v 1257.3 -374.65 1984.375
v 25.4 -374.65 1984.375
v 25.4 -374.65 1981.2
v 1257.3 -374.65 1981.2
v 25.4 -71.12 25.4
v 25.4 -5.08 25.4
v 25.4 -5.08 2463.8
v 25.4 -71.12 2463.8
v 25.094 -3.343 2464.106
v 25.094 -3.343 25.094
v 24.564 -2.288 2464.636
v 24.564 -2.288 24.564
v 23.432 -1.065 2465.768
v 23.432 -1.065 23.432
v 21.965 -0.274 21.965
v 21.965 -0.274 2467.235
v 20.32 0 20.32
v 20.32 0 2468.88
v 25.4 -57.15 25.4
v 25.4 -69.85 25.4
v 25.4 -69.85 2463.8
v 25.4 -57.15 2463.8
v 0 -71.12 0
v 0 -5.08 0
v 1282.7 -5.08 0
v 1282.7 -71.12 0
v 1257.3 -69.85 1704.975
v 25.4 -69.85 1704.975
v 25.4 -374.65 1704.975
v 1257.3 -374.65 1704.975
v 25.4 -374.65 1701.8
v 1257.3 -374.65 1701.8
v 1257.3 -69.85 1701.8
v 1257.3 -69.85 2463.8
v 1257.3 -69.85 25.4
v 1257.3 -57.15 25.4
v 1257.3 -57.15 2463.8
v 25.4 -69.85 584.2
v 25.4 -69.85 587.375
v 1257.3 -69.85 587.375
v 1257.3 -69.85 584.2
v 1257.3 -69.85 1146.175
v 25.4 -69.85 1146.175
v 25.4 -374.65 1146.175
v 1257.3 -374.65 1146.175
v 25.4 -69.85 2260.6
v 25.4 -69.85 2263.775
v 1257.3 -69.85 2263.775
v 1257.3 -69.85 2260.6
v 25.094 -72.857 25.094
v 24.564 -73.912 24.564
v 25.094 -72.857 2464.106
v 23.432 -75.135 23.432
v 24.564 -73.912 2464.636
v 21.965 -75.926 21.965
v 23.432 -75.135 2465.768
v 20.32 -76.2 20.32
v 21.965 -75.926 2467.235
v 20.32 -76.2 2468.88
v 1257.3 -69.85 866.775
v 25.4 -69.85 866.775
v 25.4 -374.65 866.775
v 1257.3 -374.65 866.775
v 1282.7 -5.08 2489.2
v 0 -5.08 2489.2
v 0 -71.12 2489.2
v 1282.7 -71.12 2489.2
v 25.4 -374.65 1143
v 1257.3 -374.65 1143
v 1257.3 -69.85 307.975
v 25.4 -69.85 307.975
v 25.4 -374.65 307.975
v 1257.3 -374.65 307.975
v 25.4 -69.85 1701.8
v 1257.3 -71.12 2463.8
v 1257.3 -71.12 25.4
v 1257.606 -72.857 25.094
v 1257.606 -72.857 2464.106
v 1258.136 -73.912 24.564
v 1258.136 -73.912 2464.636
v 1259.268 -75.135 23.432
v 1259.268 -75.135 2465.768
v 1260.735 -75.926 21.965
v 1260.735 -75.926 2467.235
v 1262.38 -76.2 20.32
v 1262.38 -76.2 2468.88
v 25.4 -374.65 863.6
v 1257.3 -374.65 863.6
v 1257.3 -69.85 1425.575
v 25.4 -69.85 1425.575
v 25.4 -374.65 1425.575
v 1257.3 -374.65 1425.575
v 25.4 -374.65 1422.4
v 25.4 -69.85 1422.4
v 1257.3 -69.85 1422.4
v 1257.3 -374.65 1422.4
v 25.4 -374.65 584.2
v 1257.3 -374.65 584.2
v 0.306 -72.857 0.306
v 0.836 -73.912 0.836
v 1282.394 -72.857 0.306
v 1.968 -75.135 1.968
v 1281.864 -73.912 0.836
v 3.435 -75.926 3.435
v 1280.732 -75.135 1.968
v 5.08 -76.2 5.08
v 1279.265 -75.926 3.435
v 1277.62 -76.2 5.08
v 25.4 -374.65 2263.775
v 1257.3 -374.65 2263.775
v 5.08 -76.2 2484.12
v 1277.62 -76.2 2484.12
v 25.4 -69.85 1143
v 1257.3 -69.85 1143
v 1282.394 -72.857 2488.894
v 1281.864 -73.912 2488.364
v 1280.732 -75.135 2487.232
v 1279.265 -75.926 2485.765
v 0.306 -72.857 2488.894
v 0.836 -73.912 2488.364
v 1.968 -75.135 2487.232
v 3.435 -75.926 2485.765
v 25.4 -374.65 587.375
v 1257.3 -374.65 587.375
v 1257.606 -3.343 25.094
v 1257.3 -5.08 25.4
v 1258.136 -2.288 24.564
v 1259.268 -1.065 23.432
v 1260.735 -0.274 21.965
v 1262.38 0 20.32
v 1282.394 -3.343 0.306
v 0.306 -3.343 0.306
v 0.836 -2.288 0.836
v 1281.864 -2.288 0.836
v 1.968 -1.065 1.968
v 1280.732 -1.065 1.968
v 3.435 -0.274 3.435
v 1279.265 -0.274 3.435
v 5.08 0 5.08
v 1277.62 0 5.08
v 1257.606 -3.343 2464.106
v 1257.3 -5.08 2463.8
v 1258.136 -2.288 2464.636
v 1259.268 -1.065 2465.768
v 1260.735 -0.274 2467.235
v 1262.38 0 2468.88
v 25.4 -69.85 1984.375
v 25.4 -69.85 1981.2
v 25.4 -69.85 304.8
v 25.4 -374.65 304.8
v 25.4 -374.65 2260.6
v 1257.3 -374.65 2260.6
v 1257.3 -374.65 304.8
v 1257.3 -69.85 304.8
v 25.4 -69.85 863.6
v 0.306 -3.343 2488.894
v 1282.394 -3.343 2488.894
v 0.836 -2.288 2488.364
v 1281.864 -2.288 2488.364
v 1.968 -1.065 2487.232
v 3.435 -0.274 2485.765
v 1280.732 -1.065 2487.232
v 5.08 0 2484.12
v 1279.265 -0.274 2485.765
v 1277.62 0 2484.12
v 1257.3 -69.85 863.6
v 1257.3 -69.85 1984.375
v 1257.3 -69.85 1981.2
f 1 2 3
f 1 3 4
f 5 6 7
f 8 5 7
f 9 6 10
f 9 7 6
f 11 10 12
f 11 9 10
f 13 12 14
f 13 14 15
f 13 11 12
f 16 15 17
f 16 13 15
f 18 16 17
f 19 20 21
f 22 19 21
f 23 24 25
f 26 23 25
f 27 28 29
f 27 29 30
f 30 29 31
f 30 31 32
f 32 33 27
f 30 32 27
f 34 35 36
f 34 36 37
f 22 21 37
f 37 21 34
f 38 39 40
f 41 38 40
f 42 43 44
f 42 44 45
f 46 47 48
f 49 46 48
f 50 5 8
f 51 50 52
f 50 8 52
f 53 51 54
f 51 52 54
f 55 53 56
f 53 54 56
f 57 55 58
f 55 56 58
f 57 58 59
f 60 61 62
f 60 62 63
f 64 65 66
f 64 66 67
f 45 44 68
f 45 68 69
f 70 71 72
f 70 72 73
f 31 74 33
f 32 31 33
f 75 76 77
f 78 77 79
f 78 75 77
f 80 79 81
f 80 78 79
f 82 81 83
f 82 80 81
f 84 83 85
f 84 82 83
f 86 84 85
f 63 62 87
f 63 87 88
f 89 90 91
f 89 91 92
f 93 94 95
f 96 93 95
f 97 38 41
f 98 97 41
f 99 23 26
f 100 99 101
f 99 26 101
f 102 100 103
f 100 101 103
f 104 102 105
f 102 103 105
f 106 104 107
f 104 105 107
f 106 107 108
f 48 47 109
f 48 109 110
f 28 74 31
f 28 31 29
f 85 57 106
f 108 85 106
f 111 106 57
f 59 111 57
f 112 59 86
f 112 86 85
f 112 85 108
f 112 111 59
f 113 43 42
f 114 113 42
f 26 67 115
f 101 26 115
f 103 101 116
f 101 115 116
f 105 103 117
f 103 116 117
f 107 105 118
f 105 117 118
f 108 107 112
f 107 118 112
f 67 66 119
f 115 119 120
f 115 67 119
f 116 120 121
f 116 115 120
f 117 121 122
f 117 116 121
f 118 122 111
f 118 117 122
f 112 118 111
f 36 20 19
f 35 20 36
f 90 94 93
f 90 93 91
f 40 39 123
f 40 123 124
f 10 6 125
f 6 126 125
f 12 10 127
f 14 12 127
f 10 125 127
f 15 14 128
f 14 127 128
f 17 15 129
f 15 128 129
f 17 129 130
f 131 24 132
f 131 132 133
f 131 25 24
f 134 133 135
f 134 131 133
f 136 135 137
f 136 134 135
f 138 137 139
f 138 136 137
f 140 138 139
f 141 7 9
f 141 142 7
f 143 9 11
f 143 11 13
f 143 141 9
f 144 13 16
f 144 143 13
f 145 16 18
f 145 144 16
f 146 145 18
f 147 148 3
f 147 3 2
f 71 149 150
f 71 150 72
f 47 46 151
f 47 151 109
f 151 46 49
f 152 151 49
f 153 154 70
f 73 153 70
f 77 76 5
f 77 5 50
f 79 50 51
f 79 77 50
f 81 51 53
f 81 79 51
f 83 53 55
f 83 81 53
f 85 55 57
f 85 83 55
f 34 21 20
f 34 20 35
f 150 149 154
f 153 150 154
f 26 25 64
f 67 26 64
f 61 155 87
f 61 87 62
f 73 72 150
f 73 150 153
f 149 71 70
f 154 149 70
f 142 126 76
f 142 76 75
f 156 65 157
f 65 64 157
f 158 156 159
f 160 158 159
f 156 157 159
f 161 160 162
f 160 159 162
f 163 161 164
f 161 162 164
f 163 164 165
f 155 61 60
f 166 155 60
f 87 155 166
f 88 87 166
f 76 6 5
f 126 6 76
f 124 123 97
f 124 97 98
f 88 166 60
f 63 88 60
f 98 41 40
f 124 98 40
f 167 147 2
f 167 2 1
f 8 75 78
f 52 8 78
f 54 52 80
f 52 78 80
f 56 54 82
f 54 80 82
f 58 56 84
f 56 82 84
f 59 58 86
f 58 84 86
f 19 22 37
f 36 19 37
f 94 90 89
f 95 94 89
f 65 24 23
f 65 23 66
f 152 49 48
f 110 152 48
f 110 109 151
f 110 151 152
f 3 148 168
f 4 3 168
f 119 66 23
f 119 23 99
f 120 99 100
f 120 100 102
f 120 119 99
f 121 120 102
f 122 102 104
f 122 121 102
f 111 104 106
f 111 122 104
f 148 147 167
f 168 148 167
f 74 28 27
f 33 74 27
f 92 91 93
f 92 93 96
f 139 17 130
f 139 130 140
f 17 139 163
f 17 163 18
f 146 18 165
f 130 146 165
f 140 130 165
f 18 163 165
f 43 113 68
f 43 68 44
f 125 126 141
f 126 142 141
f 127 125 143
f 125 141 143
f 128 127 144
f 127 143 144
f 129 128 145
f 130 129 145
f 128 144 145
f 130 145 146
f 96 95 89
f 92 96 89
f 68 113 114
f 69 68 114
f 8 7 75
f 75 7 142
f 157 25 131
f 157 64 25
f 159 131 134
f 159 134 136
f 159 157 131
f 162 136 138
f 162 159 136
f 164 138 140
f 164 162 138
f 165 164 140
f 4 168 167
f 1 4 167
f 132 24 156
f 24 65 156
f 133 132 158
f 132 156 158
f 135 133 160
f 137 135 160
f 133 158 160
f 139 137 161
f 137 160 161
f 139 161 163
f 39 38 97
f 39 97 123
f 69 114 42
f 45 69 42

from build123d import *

# Parameters (mm, degrees)
F0_W     = 1282.7
F0_H     = 2489.2
F0_W_2   = 1231.9
F0_H_2   = 2438.4
F1_DEPTH = 76.2
F2_R     = 5.08
F4_W     = 1231.9
F4_H     = 2438.4
F5_DEPTH = 12.7
F6_W     = 1231.9
F6_H     = 3.175
F7_DEPTH = 304.8


with BuildPart() as f1:
    # F0 (on Front) → F1 (new body)
    with BuildSketch(Plane.XZ):
        with Locations((641.35, 1244.6)):
            Rectangle(F0_W, F0_H)
        with Locations((641.35, 1244.6)):
            Rectangle(F0_W_2, F0_H_2, mode=Mode.SUBTRACT)
    extrude(amount=F1_DEPTH)

    # F2
    f2_edges = [f1.edges().sort_by_distance(p)[0] for p in [
        (0, -76.2, 1244.6),
        (641.35, -76.2, 0),
        (1282.7, -76.2, 1244.6),
        (641.35, -76.2, 2489.2),
        (25.4, -76.2, 1244.6),
        (641.35, -76.2, 2463.8),
        (1257.3, -76.2, 1244.6),
        (641.35, -76.2, 25.4),
        (0, 0, 1244.6),
        (641.35, 0, 0),
        (1282.7, 0, 1244.6),
        (641.35, 0, 2489.2),
        (25.4, 0, 1244.6),
        (641.35, 0, 2463.8),
        (1257.3, 0, 1244.6),
        (641.35, 0, 25.4),
    ]]
    fillet(f2_edges, radius=F2_R)


with BuildPart() as f5:
    # F4 (on offset) → F5 (new body)
    with BuildSketch(Plane.XZ.offset(69.85)):
        with Locations((641.35, 1244.6)):
            Rectangle(F4_W, F4_H)
    extrude(amount=-F5_DEPTH)


with BuildPart() as f7:
    # F6 (on face) → F7 (new body)
    with BuildSketch(Plane.XZ.offset(69.85)):
        with Locations((641.35, 306.3875)):
            Rectangle(F6_W, F6_H)
    extrude(amount=F7_DEPTH)


with BuildPart() as f7b:
    # F6 (on face) → F7, piece 2 (new body)
    with BuildSketch(Plane.XZ.offset(69.85)):
        with Locations((641.35, 585.7875)):
            Rectangle(F6_W, F6_H)
    extrude(amount=F7_DEPTH)


with BuildPart() as f7c:
    # F6 (on face) → F7, piece 3 (new body)
    with BuildSketch(Plane.XZ.offset(69.85)):
        with Locations((641.35, 865.1875)):
            Rectangle(F6_W, F6_H)
    extrude(amount=F7_DEPTH)


with BuildPart() as f7d:
    # F6 (on face) → F7, piece 4 (new body)
    with BuildSketch(Plane.XZ.offset(69.85)):
        with Locations((641.35, 1144.5875)):
            Rectangle(F6_W, F6_H)
    extrude(amount=F7_DEPTH)


with BuildPart() as f7e:
    # F6 (on face) → F7, piece 5 (new body)
    with BuildSketch(Plane.XZ.offset(69.85)):
        with Locations((641.35, 1423.9875)):
            Rectangle(F6_W, F6_H)
    extrude(amount=F7_DEPTH)


with BuildPart() as f7f:
    # F6 (on face) → F7, piece 6 (new body)
    with BuildSketch(Plane.XZ.offset(69.85)):
        with Locations((641.35, 1703.3875)):
            Rectangle(F6_W, F6_H)
    extrude(amount=F7_DEPTH)


with BuildPart() as f7g:
    # F6 (on face) → F7, piece 7 (new body)
    with BuildSketch(Plane.XZ.offset(69.85)):
        with Locations((641.35, 1982.7875)):
            Rectangle(F6_W, F6_H)
    extrude(amount=F7_DEPTH)


with BuildPart() as f7h:
    # F6 (on face) → F7, piece 8 (new body)
    with BuildSketch(Plane.XZ.offset(69.85)):
        with Locations((641.35, 2262.1875)):
            Rectangle(F6_W, F6_H)
    extrude(amount=F7_DEPTH)


solid = Compound([f1.part, f5.part, f7.part, f7b.part, f7c.part, f7d.part, f7e.part, f7f.part, f7g.part, f7h.part])
